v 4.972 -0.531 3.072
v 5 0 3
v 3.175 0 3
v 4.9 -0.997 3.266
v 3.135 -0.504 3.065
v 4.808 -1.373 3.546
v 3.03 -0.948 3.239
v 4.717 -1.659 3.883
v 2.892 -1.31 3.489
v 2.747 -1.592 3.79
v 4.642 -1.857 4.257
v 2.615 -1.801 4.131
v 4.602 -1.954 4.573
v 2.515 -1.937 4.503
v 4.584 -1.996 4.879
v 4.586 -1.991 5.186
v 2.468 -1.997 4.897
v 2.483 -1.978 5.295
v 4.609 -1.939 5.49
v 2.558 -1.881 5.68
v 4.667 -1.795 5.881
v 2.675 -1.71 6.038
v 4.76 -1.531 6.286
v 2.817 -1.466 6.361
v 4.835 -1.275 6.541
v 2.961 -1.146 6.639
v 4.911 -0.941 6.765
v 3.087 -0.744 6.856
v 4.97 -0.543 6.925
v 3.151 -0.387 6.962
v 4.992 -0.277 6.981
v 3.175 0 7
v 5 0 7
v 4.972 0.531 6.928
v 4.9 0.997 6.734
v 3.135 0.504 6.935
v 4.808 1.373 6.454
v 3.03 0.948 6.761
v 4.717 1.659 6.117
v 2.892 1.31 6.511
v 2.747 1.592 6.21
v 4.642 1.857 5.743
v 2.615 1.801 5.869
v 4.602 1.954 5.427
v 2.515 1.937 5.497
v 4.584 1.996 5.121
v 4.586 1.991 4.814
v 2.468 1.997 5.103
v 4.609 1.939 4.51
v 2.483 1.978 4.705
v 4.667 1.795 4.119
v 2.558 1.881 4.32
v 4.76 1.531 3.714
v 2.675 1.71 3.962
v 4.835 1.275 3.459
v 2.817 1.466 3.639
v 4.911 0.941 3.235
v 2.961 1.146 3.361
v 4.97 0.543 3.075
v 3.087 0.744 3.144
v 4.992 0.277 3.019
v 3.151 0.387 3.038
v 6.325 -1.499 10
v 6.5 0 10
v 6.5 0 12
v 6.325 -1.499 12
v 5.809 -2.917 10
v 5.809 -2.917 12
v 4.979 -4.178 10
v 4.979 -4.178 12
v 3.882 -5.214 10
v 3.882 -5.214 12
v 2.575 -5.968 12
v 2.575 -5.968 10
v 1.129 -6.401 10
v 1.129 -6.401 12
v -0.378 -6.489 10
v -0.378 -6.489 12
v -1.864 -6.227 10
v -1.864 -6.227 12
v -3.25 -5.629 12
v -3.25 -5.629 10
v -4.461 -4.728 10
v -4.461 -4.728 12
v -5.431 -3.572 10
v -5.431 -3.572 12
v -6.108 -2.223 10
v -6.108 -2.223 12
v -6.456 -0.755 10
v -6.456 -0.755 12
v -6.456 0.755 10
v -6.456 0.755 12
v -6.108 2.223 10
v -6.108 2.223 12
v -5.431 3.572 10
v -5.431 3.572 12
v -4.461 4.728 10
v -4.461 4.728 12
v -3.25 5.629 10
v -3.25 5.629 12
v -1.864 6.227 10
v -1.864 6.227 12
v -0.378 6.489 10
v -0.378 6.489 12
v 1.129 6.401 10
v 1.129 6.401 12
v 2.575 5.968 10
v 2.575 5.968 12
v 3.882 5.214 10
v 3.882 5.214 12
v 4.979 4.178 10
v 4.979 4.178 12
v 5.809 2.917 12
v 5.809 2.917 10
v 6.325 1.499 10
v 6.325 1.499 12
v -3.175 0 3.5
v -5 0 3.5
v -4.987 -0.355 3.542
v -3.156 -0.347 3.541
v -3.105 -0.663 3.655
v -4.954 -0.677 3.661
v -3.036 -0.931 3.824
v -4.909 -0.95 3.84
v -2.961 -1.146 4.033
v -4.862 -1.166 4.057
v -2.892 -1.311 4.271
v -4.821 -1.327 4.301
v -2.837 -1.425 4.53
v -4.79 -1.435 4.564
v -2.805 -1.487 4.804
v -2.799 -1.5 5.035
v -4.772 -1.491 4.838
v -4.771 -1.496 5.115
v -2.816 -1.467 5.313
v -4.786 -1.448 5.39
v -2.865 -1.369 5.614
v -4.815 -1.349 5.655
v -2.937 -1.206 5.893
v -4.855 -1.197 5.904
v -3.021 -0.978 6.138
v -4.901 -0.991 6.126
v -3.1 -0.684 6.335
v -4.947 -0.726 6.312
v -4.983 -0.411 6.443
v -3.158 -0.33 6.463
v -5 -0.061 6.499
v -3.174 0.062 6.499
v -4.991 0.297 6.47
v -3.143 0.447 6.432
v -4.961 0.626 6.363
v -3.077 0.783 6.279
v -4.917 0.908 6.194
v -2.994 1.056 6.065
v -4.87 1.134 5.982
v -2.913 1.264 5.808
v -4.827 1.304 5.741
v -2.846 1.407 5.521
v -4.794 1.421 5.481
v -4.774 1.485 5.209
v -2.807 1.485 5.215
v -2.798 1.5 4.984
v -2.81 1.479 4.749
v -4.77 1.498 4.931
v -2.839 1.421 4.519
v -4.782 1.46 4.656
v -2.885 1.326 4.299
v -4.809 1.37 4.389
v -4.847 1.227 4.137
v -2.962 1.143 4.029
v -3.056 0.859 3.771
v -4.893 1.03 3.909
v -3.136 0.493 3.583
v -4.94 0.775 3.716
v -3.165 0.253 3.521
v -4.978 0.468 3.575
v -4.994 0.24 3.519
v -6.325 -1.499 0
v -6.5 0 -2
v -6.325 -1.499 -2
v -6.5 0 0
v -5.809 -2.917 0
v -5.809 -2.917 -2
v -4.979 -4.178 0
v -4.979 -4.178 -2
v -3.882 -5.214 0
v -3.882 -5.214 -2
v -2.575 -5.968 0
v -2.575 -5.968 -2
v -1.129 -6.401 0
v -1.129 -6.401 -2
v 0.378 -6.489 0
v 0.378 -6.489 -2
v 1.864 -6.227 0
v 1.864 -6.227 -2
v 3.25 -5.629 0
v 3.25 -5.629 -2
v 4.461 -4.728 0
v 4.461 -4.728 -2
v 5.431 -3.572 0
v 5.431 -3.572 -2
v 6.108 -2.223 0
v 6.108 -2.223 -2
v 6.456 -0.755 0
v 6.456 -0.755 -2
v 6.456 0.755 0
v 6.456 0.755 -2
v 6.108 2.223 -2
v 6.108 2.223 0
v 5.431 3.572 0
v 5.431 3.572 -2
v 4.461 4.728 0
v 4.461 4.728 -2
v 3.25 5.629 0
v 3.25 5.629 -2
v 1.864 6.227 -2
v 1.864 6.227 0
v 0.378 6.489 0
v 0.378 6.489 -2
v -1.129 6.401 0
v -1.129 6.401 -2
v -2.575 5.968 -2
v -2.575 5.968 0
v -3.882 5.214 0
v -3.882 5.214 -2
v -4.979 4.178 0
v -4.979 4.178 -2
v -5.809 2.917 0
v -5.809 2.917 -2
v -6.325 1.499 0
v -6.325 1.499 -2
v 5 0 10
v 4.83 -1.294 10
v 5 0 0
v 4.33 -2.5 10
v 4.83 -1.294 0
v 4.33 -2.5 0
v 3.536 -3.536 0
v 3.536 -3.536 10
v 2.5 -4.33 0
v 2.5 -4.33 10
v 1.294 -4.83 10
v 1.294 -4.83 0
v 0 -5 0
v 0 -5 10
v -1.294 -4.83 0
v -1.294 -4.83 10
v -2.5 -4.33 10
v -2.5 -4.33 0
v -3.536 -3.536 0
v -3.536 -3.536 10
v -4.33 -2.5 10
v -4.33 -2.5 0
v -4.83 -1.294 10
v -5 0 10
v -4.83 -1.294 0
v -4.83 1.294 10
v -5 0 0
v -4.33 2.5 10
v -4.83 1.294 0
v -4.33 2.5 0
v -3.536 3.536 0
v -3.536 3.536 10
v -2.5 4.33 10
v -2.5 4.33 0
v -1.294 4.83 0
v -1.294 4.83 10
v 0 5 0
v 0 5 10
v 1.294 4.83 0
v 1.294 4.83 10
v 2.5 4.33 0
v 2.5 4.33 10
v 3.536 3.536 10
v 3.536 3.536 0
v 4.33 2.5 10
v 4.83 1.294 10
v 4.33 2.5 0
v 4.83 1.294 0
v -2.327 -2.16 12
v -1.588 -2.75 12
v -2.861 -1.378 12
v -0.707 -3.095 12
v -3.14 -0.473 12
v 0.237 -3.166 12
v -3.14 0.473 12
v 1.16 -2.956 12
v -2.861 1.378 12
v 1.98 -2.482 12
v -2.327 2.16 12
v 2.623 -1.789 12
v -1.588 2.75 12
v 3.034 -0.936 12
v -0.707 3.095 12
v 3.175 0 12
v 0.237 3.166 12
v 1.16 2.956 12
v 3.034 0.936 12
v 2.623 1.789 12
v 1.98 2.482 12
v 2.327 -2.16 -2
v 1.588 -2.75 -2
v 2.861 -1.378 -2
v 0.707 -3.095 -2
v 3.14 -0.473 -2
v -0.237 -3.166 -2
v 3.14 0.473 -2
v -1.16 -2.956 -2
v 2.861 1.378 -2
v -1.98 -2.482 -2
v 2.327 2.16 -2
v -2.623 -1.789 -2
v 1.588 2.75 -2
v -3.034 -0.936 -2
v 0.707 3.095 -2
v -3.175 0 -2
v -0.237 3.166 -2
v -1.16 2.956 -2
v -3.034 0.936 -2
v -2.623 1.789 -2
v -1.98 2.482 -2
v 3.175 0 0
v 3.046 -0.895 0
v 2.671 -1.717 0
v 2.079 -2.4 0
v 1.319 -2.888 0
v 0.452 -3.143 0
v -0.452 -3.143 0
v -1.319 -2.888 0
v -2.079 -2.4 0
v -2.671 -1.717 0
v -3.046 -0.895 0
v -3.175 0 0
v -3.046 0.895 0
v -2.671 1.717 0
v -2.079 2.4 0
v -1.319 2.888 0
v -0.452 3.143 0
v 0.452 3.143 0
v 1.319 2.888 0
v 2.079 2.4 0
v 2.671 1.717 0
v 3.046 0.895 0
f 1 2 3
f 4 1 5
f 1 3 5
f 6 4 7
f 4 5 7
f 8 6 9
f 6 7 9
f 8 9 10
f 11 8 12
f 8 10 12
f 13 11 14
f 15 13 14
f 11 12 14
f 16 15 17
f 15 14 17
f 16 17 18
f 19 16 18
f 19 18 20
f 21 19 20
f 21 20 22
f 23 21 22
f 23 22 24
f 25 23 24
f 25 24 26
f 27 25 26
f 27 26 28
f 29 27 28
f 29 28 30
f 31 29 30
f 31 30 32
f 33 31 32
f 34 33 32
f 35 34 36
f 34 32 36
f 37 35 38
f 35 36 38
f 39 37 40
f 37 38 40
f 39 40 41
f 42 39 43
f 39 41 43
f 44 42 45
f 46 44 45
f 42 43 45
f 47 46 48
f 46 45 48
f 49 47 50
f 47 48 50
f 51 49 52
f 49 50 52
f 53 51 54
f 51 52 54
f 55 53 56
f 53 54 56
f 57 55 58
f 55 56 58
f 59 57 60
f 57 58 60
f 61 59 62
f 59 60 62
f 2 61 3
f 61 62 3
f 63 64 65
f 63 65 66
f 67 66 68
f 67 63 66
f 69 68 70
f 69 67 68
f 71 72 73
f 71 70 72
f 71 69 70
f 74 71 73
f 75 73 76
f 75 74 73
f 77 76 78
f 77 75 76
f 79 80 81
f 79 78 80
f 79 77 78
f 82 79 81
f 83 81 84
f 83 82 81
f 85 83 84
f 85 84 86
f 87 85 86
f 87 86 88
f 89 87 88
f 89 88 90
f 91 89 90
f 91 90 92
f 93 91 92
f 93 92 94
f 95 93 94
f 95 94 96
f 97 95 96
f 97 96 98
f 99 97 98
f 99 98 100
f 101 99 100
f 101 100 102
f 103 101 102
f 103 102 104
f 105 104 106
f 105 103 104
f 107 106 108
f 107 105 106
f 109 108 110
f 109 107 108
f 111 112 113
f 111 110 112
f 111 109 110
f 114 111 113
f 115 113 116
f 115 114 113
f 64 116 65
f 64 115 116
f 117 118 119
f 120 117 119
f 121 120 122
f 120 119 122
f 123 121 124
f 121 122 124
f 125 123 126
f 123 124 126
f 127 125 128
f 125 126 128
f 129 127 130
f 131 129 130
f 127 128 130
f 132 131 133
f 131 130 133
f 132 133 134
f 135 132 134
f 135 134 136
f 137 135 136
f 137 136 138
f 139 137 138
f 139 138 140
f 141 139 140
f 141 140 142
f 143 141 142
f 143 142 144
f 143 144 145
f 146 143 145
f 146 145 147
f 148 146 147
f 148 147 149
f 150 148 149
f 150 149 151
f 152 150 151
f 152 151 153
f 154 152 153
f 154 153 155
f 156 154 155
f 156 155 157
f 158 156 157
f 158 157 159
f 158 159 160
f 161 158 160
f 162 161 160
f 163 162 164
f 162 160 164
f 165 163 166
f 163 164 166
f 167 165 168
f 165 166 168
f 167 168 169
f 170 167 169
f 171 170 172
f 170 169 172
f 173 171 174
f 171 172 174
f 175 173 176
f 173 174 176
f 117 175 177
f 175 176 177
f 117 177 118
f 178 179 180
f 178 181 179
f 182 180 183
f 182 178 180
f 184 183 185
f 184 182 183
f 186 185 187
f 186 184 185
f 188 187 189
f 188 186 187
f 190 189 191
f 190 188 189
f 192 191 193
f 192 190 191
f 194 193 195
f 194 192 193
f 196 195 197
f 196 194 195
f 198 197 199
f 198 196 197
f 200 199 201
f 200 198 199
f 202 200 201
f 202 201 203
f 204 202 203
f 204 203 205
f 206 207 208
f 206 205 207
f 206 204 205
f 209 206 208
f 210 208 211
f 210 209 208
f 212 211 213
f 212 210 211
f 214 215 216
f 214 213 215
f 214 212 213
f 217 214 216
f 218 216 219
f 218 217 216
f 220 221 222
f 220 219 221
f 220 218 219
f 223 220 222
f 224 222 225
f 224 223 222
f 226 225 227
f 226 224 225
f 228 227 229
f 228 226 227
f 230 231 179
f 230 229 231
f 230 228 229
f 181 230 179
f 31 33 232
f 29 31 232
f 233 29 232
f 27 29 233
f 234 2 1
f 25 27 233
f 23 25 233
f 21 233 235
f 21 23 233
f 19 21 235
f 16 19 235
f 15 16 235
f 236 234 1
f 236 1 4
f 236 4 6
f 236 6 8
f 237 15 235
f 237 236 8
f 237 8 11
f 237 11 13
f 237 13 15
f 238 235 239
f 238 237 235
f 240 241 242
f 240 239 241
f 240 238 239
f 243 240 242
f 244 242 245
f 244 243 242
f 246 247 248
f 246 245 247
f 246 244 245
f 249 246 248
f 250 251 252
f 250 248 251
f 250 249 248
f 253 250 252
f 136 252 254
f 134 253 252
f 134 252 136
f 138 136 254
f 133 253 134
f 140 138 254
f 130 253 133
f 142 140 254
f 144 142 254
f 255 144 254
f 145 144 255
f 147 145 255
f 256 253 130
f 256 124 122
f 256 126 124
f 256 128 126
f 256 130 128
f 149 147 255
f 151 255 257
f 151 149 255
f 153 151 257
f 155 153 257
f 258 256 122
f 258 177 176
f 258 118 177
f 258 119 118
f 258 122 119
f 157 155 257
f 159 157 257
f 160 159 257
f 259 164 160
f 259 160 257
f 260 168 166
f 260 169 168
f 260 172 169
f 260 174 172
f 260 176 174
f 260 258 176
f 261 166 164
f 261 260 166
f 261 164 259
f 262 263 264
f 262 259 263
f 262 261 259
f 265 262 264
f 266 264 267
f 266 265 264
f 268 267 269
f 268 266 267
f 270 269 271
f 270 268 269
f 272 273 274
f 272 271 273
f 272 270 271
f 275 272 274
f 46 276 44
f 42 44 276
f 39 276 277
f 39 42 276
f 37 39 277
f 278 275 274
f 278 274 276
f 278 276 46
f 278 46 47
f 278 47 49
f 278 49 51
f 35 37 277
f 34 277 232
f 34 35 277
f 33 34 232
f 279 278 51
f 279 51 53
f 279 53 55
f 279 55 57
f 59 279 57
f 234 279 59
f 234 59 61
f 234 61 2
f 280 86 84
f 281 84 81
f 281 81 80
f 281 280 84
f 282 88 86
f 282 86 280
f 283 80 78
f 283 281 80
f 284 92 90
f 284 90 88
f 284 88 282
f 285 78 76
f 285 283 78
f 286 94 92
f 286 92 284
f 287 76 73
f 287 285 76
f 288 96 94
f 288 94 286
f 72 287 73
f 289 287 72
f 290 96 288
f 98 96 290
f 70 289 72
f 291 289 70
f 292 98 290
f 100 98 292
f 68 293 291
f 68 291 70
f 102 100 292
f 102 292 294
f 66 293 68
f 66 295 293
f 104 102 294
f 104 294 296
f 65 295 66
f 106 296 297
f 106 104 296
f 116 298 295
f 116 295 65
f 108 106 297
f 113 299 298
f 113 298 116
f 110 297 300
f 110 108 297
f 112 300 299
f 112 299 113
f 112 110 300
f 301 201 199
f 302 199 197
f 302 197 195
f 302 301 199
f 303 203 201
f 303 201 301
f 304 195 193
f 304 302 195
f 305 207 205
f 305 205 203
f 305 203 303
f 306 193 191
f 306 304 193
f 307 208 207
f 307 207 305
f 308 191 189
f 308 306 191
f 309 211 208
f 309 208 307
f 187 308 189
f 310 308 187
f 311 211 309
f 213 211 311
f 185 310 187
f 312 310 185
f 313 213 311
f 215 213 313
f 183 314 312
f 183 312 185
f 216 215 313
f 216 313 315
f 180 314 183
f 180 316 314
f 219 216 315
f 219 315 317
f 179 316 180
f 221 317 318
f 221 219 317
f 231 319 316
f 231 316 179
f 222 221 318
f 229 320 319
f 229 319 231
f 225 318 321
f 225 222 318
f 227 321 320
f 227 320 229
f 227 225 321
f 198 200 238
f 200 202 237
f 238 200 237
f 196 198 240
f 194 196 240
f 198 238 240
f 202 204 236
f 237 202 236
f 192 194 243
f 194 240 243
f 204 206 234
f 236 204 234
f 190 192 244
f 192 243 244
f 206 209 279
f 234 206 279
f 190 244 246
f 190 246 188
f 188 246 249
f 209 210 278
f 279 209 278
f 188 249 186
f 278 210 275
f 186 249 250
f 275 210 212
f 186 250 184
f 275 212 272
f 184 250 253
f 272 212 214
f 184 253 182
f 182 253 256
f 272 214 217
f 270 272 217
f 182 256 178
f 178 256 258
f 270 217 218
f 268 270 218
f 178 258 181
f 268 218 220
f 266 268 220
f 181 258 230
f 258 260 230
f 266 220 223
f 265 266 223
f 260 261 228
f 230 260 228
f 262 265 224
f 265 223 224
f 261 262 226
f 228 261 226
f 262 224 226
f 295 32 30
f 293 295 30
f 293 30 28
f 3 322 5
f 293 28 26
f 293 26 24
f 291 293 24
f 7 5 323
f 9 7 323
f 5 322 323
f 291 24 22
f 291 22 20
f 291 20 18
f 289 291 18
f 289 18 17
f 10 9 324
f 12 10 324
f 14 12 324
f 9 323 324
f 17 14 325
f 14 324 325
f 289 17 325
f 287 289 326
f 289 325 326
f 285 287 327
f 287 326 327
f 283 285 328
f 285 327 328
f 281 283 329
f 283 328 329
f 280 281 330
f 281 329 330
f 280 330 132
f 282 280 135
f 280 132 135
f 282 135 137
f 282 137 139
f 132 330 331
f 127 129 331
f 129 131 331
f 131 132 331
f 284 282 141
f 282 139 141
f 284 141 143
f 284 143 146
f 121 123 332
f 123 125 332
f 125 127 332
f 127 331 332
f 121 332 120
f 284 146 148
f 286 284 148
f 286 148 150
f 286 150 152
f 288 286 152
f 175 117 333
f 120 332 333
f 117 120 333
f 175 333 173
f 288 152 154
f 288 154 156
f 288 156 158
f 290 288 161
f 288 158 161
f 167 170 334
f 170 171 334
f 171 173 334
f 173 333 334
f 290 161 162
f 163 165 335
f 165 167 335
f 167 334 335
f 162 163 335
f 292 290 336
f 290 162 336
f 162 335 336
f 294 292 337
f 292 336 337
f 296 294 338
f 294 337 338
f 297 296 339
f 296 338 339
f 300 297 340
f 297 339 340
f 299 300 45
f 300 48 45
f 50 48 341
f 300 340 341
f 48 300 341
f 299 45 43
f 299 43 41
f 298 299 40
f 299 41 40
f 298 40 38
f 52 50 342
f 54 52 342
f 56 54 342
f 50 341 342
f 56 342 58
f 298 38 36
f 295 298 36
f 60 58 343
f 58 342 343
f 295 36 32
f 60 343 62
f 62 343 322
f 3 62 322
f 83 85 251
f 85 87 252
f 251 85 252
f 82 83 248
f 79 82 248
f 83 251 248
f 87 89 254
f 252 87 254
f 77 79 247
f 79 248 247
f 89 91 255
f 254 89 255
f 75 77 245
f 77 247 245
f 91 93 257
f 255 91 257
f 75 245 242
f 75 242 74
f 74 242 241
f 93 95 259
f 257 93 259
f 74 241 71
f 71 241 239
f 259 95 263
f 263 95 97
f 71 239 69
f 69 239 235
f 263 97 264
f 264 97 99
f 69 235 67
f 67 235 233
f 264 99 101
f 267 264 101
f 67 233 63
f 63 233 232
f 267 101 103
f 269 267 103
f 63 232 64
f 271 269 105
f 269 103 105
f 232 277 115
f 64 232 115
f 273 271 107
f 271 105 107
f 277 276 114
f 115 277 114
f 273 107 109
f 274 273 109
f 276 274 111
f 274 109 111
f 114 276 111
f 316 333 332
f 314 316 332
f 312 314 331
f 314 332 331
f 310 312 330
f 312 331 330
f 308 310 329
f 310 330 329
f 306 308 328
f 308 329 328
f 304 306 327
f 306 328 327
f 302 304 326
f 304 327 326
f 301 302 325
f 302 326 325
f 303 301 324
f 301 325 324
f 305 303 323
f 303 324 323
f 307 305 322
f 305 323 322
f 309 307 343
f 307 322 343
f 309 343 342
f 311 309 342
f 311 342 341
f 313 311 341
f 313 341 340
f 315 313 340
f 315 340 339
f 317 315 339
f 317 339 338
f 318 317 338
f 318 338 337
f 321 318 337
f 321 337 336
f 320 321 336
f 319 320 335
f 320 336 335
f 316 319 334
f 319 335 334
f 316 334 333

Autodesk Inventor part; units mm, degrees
ref_plane "XZ Plane" through (0, 0, 0) normal (0, 1, 0) x (-1, 0, 0)
ref_plane "XY Plane" through (0, 0, 0) normal (0, 0, 1) x (1, 0, 0)
sketch "Sketch1" plane through (0, 0, 0) normal (0, 0, 1) x (1, 0, 0)
  circle A0 centre (0, 0) radius 5
  circle A1 centre (0, 0) radius 3.175
  dimension "d0" = 10
  dimension "d1" = 6.35
extrude "Extrusion1" add sketch "Sketch1" along normal blind 10
sketch "Sketch2" plane through (0, 0, 10) normal (0, 0, 1) x (1, 0, 0)
  circle A0 centre (0, 0) radius 6.5
  circle A1 centre (0, 0) radius 3.175 projected
  dimension "d4" = 13
sketch "Sketch4" plane through (0, 0, 0) normal (0, 0, -1) x (-1, 0, 0)
  circle A0 centre (0, 0) radius 6.5
  circle A1 centre (0, 0) radius 3.175 projected
  dimension "d8" = 13
extrude "Extrusion4" add sketch "Sketch2" along normal blind 2
extrude "Extrusion5" add sketch "Sketch4" along normal blind 2
ref_plane "Work Plane1" through (5, 0, 0) normal (1, 0, 0) x (0, 1, 0)
sketch "Sketch5" plane through (5, 0, 0) normal (1, 0, 0) x (0, 1, 0)
  line L0 (6.5, 0) -> (-6.5, 0) projected
  line L1 (-6.5, 10) -> (6.5, 10) projected
  line L2 (0, 0) -> (0, 10)
  point P0 (0, 5)
hole "Hole1" at (5, 0, 5) direction (-1, 0, 0) diameter 3 end through all counterbore diameter 4 counterbore depth 3
ref_plane "Work Plane2" through (-5, 0, 0) normal (1, 0, 0) x (0, 1, 0)
sketch "Sketch6" plane through (-5, 0, 0) normal (1, 0, 0) x (0, 1, 0)
  line L0 (0, 3.5) -> (0, 3.5)
  point P0 (0, 0)
  point P1 (1.5, 5)
equation "\"d13\" = lip"
equation "\"d15\" = lip"
equation "\"lip\" = 2"
properties part number "firstSpindle"
